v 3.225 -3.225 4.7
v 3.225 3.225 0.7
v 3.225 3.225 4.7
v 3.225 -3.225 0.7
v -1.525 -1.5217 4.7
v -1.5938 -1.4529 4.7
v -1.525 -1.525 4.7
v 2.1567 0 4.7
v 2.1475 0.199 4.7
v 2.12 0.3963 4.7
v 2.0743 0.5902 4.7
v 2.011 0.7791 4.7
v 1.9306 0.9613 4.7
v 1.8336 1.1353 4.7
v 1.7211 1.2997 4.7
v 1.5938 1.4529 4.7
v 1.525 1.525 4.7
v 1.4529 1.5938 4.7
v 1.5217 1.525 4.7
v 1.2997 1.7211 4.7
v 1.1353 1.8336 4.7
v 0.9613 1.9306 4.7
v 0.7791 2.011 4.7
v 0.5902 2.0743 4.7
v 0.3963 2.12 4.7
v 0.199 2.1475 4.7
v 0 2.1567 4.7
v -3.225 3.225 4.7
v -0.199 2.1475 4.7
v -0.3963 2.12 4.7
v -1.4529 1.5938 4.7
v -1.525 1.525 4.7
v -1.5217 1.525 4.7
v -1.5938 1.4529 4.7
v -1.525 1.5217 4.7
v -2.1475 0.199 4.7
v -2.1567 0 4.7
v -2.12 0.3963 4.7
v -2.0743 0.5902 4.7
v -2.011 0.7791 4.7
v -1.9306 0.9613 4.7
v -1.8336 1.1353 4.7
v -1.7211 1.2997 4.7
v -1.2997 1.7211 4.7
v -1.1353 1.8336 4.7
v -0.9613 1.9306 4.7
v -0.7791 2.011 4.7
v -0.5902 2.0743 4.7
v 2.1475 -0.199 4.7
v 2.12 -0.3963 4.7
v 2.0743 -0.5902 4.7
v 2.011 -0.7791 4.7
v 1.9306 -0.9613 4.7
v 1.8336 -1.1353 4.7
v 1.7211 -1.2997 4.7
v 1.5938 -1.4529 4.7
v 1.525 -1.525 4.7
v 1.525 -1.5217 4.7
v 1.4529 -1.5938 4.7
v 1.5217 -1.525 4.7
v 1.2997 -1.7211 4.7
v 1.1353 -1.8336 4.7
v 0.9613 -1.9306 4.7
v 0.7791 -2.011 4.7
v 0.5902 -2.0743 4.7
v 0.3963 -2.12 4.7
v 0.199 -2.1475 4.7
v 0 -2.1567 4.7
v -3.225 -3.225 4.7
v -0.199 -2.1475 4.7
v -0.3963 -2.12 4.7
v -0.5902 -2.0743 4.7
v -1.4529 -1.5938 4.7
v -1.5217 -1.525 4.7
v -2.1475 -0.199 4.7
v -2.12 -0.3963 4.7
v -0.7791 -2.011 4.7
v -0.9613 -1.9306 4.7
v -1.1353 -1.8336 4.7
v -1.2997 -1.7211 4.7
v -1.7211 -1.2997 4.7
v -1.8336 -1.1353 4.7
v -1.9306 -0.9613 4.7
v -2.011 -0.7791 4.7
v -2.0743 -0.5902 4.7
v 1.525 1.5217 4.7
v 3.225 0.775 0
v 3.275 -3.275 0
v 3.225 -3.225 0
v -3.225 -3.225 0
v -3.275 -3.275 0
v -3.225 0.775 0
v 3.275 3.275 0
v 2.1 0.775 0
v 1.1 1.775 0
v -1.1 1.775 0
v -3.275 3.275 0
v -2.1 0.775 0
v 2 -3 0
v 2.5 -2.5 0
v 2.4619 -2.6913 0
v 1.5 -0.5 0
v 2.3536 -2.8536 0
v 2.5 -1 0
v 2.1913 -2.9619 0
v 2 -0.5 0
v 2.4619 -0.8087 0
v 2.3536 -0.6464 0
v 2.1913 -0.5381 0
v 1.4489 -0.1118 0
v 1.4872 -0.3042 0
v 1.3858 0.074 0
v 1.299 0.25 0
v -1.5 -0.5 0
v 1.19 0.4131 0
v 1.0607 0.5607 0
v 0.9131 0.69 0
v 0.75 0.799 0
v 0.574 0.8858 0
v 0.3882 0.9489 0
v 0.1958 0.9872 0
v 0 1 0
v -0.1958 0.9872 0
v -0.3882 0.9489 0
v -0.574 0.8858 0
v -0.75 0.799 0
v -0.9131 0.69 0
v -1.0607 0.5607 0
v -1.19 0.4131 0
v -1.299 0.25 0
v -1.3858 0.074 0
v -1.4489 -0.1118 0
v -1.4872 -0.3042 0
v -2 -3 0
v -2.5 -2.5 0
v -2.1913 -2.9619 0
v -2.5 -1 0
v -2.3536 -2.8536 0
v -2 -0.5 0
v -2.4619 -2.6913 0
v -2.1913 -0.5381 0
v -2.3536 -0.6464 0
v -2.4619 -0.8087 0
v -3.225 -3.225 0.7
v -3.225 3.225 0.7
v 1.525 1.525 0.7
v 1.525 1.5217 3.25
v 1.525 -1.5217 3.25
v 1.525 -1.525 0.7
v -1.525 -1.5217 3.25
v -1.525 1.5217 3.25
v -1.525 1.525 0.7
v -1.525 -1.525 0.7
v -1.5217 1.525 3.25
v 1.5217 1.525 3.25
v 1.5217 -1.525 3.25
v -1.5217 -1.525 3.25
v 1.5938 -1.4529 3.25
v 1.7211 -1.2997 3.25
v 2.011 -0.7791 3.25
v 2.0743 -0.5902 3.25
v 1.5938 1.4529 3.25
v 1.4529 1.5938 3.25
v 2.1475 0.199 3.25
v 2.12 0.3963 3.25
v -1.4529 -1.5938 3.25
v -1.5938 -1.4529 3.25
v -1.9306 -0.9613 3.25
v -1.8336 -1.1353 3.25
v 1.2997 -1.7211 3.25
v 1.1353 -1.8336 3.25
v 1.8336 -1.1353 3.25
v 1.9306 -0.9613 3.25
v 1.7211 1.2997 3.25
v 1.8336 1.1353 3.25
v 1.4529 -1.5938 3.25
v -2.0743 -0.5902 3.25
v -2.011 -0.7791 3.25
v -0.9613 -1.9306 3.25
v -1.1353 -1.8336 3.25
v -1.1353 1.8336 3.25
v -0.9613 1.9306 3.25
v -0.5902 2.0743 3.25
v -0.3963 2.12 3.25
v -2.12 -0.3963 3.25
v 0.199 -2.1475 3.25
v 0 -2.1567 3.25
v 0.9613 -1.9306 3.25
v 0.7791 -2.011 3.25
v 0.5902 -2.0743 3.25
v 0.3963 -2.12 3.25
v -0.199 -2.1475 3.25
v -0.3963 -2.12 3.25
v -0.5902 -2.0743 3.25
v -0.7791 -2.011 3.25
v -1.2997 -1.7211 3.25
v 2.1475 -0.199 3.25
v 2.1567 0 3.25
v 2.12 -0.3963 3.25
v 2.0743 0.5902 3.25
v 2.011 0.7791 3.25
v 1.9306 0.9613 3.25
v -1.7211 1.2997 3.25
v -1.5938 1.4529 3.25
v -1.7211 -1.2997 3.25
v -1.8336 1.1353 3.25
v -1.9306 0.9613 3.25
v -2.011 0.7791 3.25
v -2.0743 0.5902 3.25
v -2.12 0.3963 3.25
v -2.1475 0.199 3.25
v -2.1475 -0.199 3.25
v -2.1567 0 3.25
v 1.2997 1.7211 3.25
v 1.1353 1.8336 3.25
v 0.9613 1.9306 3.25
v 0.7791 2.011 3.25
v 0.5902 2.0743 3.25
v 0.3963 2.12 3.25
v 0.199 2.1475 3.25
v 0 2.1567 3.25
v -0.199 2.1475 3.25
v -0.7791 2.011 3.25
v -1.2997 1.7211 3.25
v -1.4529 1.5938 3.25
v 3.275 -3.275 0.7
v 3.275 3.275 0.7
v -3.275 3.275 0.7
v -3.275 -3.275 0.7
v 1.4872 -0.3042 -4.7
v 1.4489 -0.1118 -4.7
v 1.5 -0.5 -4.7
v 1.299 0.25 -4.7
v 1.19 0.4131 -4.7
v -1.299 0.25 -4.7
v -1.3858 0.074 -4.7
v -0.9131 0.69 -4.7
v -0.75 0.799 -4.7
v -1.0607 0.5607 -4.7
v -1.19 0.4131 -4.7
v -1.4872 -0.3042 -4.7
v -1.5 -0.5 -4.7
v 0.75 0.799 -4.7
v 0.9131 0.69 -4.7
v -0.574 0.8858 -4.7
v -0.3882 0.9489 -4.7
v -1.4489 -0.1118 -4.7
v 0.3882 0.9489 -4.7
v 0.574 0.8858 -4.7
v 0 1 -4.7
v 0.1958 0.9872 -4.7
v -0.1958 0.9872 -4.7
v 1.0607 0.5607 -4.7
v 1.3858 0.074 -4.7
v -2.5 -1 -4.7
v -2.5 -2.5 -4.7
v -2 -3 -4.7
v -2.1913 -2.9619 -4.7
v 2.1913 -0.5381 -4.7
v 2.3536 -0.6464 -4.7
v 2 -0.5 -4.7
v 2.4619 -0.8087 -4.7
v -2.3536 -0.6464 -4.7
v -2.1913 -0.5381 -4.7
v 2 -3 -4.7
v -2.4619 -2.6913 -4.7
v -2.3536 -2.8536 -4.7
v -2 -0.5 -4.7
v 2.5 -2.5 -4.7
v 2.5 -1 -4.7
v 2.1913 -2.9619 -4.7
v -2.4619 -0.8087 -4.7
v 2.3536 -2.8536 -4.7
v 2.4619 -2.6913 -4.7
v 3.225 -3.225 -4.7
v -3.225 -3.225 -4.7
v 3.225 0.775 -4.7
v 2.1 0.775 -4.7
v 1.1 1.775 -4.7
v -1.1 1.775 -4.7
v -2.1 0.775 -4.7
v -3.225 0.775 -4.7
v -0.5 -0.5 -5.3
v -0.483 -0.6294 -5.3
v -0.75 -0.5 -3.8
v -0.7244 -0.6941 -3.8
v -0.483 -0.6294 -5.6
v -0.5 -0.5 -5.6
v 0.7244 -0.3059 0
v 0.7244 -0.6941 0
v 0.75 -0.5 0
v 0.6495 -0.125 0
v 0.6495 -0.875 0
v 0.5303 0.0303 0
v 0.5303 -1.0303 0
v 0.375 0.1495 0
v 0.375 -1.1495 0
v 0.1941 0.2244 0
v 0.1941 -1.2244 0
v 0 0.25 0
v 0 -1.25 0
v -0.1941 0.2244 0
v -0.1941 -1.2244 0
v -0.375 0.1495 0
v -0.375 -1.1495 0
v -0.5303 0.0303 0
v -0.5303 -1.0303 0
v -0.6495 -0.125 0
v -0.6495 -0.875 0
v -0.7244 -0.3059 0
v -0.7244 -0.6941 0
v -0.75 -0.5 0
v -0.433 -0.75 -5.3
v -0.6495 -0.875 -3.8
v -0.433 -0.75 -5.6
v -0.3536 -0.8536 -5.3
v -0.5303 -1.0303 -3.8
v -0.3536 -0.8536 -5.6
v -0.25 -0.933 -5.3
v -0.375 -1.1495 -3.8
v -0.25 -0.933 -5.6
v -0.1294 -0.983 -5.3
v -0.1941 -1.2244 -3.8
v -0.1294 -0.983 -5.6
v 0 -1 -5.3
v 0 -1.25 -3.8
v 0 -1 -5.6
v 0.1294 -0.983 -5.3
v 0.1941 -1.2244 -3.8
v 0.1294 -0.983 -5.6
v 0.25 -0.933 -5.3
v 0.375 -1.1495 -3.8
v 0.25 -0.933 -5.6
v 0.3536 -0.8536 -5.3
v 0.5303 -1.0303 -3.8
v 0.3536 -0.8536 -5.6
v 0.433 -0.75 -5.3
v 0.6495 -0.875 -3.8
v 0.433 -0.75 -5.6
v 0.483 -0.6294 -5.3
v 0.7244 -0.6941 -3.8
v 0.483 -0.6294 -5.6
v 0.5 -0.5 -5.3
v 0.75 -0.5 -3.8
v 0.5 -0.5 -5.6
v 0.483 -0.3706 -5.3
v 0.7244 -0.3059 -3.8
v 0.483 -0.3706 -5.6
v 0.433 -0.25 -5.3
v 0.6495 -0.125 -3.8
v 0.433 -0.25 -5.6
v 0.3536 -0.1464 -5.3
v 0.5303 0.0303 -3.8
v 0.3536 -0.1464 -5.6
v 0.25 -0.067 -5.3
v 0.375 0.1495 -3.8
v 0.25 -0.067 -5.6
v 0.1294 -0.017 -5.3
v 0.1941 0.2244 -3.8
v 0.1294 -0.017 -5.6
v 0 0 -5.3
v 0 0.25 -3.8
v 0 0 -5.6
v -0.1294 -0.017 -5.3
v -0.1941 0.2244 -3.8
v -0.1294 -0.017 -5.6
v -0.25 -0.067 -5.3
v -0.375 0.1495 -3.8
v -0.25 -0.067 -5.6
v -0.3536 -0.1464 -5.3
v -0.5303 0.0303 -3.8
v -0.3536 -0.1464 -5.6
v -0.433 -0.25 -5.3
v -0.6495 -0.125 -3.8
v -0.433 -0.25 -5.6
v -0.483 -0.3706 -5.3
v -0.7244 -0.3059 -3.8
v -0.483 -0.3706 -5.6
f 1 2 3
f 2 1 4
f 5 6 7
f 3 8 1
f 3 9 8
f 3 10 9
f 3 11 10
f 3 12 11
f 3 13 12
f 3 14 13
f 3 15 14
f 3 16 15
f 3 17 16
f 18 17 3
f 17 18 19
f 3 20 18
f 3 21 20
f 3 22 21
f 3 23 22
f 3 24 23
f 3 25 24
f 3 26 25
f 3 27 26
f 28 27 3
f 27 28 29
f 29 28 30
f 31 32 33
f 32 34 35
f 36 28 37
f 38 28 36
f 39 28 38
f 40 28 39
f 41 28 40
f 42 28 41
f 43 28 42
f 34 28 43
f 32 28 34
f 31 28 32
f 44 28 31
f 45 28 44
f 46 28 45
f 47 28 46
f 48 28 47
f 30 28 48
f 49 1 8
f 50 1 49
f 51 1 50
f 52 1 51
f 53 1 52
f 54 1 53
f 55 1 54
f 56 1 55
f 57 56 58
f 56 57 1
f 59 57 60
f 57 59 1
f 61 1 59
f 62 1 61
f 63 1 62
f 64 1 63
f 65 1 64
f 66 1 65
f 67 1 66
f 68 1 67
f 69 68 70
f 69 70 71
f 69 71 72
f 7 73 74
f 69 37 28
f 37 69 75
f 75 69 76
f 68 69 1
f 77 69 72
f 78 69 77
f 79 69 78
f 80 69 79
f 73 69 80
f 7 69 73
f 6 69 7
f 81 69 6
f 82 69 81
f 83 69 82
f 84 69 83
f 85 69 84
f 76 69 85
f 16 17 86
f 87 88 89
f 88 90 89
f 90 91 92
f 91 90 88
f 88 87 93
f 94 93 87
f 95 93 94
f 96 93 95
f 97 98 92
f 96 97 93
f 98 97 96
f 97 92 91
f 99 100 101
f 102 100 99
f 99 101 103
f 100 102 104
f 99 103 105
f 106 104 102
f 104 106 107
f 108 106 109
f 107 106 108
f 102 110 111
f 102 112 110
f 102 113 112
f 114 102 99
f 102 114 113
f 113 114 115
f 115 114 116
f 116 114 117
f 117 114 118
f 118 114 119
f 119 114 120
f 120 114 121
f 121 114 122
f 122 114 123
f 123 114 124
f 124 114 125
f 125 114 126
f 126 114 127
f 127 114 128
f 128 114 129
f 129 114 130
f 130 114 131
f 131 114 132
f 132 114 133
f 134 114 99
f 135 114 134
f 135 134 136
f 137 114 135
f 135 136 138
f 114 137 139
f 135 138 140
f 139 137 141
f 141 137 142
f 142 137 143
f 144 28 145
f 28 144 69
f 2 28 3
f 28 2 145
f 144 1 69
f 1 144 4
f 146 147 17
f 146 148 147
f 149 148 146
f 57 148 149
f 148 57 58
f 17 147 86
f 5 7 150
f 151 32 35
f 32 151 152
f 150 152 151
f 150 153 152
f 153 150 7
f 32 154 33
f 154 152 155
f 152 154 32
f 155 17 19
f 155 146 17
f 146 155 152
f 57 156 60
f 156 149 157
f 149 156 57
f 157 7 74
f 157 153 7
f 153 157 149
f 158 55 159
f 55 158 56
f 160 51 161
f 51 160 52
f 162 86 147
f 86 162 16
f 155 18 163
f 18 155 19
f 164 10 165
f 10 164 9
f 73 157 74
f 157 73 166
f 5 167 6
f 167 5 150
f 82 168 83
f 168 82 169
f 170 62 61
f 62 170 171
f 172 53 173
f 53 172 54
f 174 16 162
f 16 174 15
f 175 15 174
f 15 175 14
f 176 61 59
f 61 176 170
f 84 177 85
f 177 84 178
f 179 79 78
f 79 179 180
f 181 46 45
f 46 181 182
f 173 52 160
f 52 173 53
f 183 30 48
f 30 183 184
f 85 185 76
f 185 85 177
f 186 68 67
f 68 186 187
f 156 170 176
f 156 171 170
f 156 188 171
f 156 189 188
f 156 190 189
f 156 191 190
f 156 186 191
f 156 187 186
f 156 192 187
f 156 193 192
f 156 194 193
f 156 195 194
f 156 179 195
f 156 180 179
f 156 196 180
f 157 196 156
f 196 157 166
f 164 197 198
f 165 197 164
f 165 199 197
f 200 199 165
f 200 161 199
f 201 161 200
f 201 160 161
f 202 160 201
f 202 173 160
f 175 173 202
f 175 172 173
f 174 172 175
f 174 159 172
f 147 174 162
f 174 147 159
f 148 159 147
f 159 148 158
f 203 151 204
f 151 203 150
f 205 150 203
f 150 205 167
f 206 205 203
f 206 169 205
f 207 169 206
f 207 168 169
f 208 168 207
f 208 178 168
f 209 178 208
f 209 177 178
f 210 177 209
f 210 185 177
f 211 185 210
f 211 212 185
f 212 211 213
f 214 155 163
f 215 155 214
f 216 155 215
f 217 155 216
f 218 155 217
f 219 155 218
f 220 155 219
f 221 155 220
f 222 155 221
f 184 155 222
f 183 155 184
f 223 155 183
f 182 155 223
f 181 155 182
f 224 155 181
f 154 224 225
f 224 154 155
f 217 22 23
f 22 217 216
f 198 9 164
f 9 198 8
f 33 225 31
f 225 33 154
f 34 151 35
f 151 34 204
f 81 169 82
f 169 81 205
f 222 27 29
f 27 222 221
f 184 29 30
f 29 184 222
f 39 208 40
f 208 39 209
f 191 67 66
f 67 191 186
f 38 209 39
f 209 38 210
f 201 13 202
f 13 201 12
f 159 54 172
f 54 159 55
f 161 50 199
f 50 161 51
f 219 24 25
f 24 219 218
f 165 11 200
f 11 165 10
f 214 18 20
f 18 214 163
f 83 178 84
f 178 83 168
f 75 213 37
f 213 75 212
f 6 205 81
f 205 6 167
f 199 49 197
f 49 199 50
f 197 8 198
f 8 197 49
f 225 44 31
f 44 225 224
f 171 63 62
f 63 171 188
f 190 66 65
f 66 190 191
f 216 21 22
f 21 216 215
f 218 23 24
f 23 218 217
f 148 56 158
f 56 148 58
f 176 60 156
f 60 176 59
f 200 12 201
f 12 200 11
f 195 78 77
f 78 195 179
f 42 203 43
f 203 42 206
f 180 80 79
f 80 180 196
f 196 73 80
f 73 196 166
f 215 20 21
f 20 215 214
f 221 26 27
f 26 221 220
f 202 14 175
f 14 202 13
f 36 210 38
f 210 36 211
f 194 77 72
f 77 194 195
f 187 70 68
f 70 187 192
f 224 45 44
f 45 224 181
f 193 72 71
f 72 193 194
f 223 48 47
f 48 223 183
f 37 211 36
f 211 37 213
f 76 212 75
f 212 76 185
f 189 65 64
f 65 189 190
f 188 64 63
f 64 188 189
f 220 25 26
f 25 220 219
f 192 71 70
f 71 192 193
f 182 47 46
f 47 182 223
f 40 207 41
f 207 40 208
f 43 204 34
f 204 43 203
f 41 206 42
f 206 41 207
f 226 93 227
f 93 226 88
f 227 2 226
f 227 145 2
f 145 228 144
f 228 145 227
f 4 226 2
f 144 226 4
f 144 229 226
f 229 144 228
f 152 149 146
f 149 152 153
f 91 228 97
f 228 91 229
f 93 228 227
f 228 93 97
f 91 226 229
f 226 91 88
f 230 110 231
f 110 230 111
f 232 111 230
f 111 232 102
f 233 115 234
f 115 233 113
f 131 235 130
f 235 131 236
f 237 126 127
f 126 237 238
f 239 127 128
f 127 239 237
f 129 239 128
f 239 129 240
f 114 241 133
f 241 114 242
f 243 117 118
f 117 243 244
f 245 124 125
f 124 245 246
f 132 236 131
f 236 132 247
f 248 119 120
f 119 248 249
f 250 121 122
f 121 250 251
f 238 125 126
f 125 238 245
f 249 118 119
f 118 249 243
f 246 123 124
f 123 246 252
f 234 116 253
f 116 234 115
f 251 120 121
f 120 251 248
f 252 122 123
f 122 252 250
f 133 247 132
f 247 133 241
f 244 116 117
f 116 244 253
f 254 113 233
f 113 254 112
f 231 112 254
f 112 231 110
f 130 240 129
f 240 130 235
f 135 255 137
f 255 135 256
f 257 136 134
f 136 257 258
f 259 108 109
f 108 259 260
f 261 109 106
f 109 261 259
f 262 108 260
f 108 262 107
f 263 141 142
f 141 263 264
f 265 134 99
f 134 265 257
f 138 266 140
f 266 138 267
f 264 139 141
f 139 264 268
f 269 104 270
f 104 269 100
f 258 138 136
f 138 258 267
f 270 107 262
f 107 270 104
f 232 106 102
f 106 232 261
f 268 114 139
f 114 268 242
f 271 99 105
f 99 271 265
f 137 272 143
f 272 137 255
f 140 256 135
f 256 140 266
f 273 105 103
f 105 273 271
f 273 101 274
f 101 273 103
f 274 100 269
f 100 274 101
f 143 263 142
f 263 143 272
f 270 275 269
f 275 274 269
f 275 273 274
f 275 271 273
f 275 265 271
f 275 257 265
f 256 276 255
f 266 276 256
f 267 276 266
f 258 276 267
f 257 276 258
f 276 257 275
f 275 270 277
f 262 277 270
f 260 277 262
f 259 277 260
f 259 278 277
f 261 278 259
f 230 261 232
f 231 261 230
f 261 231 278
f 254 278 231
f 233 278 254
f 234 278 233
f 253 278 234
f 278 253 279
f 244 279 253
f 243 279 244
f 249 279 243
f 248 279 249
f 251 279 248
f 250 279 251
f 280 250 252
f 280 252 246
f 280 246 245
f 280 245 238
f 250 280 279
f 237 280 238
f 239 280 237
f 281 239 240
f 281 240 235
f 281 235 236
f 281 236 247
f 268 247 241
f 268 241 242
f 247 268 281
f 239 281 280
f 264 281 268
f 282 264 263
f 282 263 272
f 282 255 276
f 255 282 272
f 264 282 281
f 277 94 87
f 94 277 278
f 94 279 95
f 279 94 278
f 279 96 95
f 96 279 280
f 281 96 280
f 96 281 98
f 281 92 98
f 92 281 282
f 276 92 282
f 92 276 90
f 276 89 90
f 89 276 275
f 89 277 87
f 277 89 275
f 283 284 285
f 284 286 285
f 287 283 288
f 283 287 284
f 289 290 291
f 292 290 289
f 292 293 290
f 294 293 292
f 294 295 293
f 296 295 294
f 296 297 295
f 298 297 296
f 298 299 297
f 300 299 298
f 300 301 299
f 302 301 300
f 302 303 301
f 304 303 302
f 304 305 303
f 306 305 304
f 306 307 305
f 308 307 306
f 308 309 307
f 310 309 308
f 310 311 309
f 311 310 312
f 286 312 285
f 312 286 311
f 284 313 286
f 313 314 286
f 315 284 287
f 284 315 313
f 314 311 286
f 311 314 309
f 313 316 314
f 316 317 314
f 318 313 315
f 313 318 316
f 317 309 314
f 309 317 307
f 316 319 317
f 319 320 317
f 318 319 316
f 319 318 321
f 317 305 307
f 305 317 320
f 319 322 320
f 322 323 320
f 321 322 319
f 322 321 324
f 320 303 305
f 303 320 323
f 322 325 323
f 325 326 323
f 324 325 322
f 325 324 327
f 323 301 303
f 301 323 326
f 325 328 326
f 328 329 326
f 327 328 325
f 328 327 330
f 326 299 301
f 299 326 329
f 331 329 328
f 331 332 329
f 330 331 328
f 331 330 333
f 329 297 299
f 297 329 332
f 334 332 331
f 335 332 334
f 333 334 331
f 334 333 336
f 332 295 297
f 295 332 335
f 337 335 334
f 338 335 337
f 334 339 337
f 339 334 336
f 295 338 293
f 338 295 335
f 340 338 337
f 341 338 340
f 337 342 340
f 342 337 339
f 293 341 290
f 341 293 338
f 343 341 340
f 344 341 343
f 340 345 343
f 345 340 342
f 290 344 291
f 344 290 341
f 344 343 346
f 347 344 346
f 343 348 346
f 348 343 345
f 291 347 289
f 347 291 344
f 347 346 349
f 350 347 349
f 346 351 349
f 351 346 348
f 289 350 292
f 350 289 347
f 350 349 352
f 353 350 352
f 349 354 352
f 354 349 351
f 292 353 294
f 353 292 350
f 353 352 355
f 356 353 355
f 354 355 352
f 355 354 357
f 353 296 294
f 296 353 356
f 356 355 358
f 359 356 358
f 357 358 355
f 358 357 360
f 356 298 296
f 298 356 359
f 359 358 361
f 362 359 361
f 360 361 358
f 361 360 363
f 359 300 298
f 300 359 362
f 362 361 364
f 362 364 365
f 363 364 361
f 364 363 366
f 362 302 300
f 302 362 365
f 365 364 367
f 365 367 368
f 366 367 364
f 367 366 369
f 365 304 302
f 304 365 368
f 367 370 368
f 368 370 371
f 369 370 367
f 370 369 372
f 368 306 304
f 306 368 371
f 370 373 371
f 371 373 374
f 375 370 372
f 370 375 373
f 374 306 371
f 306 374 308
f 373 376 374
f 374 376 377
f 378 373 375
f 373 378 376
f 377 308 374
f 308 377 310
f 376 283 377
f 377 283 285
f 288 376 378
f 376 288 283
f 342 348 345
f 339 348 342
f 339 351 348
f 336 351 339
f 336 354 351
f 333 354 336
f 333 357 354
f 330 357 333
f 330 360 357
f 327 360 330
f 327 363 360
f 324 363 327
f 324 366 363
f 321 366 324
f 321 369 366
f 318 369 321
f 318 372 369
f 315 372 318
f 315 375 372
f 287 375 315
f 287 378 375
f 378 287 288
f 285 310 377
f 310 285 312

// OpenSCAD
$fa = 1;
$fs = 0.2;

// Cap type
cap_type = "Atari130XE"; // [KailhBox, Atari130XE]

// Stem type
stem_type = "KailhBoxPink"; // [KailhBoxPink]

module nil() {}

box_width = 6.45;
box_height = 4.7;
box_inner_width = 6;
box_inner_corner_radius = 2;
box_cross_x_thickness = 1.3;
box_cross_y_thickness = 1.1;
box_cross_width = 4;
box_bottom_thickness = 0.7;
box_bottom_outer_offset = 0.05;

module kailh_box() {
  union() {
    difference() {
      cube([box_width, box_width, box_height], center = true);
      minkowski() {
        cube([
          box_inner_width - box_inner_corner_radius * 2,
          box_inner_width - box_inner_corner_radius * 2,
          box_height + 0.1], center = true);
        cylinder(r = box_inner_corner_radius);
      }
    };
    cube([box_cross_width, box_cross_x_thickness, box_height], center = true);
    cube([box_cross_y_thickness, box_cross_width, box_height], center = true);
    translate([0, 0, (box_bottom_thickness - box_height) / 2])
      cube([box_width + box_bottom_outer_offset * 2, box_width + box_bottom_outer_offset * 2, box_bottom_thickness], center = true);
  }
}

atari_box_width = 6.45;
atari_box_height = 4.7;
atari_square_width = 3.05;
atari_square_depth = 2.8;
atari_box_bottom_thickness = 0.7;
atari_box_bottom_outer_offset = 0.05;

module atari130xe_box() {
  union() {
    difference() {
      cube([atari_box_width, atari_box_width, atari_box_height], center = true);
      cube([atari_square_width, atari_square_width, atari_box_height + 0.1], center = true);
      translate([0, 0, (atari_square_depth - 1) / 2])
        cylinder(r = atari_square_width * sqrt(2) / 2, h = atari_box_height - atari_square_depth + 0.1);
    }
    translate([0, 0, (atari_box_bottom_thickness - atari_box_height) / 2])
      cube([atari_box_width + atari_box_bottom_outer_offset * 2, atari_box_width + atari_box_bottom_outer_offset * 2, atari_box_bottom_thickness], center = true);
  }
}

kailh_stem_spring_column_height = 5.6;
kailh_stem_spring_column_bottom_diameter = 1.5;
kailh_stem_spring_column_upper_diameter = 1;
kailh_stem_spring_column_top_height = 0.3;
kailh_stem_spring_column_cone_height = 1.5;
kailh_stem_spring_column_offset = -0.5; // TODO: measure that
kailh_stem_main_height = 5;
kailh_stem_main_width = box_width;
kailh_stem_main_depth = 4; // TODO: measure that
kailh_stem_main_extension_depth = 1;
kailh_stem_main_extension_width = 2.2;
kailh_stem_main_hole_diameter = 3; // TODO: measure that
kailh_stem_main_hole_width = 5;
kailh_stem_main_hole_depth = 2.5; // TODO: measure that
kailh_stem_main_hole_corner_radius = 0.5;
kailh_stem_rails_thickness = 0.6;


kailh_stem_height = kailh_stem_spring_column_height;

module kailh_stem() {
  union() {
    // Main part
    translate([0, 0, kailh_stem_spring_column_height - kailh_stem_main_height])
      difference() {
        linear_extrude(height = kailh_stem_main_height, center = true) {
          polygon(points = [
            [-kailh_stem_main_width / 2, -box_width / 2],
            [kailh_stem_main_width / 2, -box_width / 2],
            [kailh_stem_main_width / 2, kailh_stem_main_depth - box_width / 2],
            [kailh_stem_main_extension_width / 2 + kailh_stem_main_extension_depth, kailh_stem_main_depth - box_width / 2],
            [kailh_stem_main_extension_width / 2, kailh_stem_main_depth - box_width / 2 + kailh_stem_main_extension_depth],
            [-kailh_stem_main_extension_width / 2, kailh_stem_main_depth - box_width / 2 + kailh_stem_main_extension_depth],
            [-kailh_stem_main_extension_width / 2 - kailh_stem_main_extension_depth, kailh_stem_main_depth - box_width / 2],
            [-kailh_stem_main_width / 2, kailh_stem_main_depth - box_width / 2],
          ]);
        }
        translate([0, kailh_stem_spring_column_offset, 0])
          union() {
            cylinder(r = kailh_stem_main_hole_diameter / 2, h = kailh_stem_main_height + 1, center = true);
            hull() {
              translate([kailh_stem_main_hole_corner_radius - kailh_stem_main_hole_width / 2, -kailh_stem_main_hole_corner_radius, 0])
                cylinder(r = kailh_stem_main_hole_corner_radius, h = kailh_stem_main_height + 1, center = true);
              translate([kailh_stem_main_hole_width / 2 - kailh_stem_main_hole_corner_radius, -kailh_stem_main_hole_corner_radius, 0])
                cylinder(r = kailh_stem_main_hole_corner_radius, h = kailh_stem_main_height + 1, center = true);
              translate([kailh_stem_main_hole_corner_radius - kailh_stem_main_hole_width / 2, kailh_stem_main_hole_corner_radius - kailh_stem_main_hole_depth, 0])
                cylinder(r = kailh_stem_main_hole_corner_radius, h = kailh_stem_main_height + 1, center = true);
              translate([kailh_stem_main_hole_width / 2 - kailh_stem_main_hole_corner_radius, kailh_stem_main_hole_corner_radius - kailh_stem_main_hole_depth, 0])
                cylinder(r = kailh_stem_main_hole_corner_radius, h = kailh_stem_main_height + 1, center = true);
            }
          }
      }
    // Spring cone
    translate([0, kailh_stem_spring_column_offset, kailh_stem_spring_column_height / 2])
      rotate([180, 0, 0])
        rotate_extrude()
          polygon(points = [
            [0, 0],
            [kailh_stem_spring_column_bottom_diameter / 2, 0],
            [kailh_stem_spring_column_bottom_diameter / 2, kailh_stem_spring_column_height - kailh_stem_spring_column_cone_height - kailh_stem_spring_column_top_height],
            [kailh_stem_spring_column_upper_diameter / 2, kailh_stem_spring_column_height - kailh_stem_spring_column_top_height],
            [kailh_stem_spring_column_upper_diameter / 2, kailh_stem_spring_column_height],
            [0, kailh_stem_spring_column_height]
          ]);
  }
}

union() {
  if (cap_type == "KailhBox") {
    translate([0, 0, box_height / 2])
      kailh_box();
  }
  if (cap_type == "Atari130XE") {
    translate([0, 0, atari_box_height / 2])
      atari130xe_box();
  }
  if (stem_type == "KailhBoxPink") {
    translate([0, 0, -kailh_stem_height / 2])
      kailh_stem();
  }
}
